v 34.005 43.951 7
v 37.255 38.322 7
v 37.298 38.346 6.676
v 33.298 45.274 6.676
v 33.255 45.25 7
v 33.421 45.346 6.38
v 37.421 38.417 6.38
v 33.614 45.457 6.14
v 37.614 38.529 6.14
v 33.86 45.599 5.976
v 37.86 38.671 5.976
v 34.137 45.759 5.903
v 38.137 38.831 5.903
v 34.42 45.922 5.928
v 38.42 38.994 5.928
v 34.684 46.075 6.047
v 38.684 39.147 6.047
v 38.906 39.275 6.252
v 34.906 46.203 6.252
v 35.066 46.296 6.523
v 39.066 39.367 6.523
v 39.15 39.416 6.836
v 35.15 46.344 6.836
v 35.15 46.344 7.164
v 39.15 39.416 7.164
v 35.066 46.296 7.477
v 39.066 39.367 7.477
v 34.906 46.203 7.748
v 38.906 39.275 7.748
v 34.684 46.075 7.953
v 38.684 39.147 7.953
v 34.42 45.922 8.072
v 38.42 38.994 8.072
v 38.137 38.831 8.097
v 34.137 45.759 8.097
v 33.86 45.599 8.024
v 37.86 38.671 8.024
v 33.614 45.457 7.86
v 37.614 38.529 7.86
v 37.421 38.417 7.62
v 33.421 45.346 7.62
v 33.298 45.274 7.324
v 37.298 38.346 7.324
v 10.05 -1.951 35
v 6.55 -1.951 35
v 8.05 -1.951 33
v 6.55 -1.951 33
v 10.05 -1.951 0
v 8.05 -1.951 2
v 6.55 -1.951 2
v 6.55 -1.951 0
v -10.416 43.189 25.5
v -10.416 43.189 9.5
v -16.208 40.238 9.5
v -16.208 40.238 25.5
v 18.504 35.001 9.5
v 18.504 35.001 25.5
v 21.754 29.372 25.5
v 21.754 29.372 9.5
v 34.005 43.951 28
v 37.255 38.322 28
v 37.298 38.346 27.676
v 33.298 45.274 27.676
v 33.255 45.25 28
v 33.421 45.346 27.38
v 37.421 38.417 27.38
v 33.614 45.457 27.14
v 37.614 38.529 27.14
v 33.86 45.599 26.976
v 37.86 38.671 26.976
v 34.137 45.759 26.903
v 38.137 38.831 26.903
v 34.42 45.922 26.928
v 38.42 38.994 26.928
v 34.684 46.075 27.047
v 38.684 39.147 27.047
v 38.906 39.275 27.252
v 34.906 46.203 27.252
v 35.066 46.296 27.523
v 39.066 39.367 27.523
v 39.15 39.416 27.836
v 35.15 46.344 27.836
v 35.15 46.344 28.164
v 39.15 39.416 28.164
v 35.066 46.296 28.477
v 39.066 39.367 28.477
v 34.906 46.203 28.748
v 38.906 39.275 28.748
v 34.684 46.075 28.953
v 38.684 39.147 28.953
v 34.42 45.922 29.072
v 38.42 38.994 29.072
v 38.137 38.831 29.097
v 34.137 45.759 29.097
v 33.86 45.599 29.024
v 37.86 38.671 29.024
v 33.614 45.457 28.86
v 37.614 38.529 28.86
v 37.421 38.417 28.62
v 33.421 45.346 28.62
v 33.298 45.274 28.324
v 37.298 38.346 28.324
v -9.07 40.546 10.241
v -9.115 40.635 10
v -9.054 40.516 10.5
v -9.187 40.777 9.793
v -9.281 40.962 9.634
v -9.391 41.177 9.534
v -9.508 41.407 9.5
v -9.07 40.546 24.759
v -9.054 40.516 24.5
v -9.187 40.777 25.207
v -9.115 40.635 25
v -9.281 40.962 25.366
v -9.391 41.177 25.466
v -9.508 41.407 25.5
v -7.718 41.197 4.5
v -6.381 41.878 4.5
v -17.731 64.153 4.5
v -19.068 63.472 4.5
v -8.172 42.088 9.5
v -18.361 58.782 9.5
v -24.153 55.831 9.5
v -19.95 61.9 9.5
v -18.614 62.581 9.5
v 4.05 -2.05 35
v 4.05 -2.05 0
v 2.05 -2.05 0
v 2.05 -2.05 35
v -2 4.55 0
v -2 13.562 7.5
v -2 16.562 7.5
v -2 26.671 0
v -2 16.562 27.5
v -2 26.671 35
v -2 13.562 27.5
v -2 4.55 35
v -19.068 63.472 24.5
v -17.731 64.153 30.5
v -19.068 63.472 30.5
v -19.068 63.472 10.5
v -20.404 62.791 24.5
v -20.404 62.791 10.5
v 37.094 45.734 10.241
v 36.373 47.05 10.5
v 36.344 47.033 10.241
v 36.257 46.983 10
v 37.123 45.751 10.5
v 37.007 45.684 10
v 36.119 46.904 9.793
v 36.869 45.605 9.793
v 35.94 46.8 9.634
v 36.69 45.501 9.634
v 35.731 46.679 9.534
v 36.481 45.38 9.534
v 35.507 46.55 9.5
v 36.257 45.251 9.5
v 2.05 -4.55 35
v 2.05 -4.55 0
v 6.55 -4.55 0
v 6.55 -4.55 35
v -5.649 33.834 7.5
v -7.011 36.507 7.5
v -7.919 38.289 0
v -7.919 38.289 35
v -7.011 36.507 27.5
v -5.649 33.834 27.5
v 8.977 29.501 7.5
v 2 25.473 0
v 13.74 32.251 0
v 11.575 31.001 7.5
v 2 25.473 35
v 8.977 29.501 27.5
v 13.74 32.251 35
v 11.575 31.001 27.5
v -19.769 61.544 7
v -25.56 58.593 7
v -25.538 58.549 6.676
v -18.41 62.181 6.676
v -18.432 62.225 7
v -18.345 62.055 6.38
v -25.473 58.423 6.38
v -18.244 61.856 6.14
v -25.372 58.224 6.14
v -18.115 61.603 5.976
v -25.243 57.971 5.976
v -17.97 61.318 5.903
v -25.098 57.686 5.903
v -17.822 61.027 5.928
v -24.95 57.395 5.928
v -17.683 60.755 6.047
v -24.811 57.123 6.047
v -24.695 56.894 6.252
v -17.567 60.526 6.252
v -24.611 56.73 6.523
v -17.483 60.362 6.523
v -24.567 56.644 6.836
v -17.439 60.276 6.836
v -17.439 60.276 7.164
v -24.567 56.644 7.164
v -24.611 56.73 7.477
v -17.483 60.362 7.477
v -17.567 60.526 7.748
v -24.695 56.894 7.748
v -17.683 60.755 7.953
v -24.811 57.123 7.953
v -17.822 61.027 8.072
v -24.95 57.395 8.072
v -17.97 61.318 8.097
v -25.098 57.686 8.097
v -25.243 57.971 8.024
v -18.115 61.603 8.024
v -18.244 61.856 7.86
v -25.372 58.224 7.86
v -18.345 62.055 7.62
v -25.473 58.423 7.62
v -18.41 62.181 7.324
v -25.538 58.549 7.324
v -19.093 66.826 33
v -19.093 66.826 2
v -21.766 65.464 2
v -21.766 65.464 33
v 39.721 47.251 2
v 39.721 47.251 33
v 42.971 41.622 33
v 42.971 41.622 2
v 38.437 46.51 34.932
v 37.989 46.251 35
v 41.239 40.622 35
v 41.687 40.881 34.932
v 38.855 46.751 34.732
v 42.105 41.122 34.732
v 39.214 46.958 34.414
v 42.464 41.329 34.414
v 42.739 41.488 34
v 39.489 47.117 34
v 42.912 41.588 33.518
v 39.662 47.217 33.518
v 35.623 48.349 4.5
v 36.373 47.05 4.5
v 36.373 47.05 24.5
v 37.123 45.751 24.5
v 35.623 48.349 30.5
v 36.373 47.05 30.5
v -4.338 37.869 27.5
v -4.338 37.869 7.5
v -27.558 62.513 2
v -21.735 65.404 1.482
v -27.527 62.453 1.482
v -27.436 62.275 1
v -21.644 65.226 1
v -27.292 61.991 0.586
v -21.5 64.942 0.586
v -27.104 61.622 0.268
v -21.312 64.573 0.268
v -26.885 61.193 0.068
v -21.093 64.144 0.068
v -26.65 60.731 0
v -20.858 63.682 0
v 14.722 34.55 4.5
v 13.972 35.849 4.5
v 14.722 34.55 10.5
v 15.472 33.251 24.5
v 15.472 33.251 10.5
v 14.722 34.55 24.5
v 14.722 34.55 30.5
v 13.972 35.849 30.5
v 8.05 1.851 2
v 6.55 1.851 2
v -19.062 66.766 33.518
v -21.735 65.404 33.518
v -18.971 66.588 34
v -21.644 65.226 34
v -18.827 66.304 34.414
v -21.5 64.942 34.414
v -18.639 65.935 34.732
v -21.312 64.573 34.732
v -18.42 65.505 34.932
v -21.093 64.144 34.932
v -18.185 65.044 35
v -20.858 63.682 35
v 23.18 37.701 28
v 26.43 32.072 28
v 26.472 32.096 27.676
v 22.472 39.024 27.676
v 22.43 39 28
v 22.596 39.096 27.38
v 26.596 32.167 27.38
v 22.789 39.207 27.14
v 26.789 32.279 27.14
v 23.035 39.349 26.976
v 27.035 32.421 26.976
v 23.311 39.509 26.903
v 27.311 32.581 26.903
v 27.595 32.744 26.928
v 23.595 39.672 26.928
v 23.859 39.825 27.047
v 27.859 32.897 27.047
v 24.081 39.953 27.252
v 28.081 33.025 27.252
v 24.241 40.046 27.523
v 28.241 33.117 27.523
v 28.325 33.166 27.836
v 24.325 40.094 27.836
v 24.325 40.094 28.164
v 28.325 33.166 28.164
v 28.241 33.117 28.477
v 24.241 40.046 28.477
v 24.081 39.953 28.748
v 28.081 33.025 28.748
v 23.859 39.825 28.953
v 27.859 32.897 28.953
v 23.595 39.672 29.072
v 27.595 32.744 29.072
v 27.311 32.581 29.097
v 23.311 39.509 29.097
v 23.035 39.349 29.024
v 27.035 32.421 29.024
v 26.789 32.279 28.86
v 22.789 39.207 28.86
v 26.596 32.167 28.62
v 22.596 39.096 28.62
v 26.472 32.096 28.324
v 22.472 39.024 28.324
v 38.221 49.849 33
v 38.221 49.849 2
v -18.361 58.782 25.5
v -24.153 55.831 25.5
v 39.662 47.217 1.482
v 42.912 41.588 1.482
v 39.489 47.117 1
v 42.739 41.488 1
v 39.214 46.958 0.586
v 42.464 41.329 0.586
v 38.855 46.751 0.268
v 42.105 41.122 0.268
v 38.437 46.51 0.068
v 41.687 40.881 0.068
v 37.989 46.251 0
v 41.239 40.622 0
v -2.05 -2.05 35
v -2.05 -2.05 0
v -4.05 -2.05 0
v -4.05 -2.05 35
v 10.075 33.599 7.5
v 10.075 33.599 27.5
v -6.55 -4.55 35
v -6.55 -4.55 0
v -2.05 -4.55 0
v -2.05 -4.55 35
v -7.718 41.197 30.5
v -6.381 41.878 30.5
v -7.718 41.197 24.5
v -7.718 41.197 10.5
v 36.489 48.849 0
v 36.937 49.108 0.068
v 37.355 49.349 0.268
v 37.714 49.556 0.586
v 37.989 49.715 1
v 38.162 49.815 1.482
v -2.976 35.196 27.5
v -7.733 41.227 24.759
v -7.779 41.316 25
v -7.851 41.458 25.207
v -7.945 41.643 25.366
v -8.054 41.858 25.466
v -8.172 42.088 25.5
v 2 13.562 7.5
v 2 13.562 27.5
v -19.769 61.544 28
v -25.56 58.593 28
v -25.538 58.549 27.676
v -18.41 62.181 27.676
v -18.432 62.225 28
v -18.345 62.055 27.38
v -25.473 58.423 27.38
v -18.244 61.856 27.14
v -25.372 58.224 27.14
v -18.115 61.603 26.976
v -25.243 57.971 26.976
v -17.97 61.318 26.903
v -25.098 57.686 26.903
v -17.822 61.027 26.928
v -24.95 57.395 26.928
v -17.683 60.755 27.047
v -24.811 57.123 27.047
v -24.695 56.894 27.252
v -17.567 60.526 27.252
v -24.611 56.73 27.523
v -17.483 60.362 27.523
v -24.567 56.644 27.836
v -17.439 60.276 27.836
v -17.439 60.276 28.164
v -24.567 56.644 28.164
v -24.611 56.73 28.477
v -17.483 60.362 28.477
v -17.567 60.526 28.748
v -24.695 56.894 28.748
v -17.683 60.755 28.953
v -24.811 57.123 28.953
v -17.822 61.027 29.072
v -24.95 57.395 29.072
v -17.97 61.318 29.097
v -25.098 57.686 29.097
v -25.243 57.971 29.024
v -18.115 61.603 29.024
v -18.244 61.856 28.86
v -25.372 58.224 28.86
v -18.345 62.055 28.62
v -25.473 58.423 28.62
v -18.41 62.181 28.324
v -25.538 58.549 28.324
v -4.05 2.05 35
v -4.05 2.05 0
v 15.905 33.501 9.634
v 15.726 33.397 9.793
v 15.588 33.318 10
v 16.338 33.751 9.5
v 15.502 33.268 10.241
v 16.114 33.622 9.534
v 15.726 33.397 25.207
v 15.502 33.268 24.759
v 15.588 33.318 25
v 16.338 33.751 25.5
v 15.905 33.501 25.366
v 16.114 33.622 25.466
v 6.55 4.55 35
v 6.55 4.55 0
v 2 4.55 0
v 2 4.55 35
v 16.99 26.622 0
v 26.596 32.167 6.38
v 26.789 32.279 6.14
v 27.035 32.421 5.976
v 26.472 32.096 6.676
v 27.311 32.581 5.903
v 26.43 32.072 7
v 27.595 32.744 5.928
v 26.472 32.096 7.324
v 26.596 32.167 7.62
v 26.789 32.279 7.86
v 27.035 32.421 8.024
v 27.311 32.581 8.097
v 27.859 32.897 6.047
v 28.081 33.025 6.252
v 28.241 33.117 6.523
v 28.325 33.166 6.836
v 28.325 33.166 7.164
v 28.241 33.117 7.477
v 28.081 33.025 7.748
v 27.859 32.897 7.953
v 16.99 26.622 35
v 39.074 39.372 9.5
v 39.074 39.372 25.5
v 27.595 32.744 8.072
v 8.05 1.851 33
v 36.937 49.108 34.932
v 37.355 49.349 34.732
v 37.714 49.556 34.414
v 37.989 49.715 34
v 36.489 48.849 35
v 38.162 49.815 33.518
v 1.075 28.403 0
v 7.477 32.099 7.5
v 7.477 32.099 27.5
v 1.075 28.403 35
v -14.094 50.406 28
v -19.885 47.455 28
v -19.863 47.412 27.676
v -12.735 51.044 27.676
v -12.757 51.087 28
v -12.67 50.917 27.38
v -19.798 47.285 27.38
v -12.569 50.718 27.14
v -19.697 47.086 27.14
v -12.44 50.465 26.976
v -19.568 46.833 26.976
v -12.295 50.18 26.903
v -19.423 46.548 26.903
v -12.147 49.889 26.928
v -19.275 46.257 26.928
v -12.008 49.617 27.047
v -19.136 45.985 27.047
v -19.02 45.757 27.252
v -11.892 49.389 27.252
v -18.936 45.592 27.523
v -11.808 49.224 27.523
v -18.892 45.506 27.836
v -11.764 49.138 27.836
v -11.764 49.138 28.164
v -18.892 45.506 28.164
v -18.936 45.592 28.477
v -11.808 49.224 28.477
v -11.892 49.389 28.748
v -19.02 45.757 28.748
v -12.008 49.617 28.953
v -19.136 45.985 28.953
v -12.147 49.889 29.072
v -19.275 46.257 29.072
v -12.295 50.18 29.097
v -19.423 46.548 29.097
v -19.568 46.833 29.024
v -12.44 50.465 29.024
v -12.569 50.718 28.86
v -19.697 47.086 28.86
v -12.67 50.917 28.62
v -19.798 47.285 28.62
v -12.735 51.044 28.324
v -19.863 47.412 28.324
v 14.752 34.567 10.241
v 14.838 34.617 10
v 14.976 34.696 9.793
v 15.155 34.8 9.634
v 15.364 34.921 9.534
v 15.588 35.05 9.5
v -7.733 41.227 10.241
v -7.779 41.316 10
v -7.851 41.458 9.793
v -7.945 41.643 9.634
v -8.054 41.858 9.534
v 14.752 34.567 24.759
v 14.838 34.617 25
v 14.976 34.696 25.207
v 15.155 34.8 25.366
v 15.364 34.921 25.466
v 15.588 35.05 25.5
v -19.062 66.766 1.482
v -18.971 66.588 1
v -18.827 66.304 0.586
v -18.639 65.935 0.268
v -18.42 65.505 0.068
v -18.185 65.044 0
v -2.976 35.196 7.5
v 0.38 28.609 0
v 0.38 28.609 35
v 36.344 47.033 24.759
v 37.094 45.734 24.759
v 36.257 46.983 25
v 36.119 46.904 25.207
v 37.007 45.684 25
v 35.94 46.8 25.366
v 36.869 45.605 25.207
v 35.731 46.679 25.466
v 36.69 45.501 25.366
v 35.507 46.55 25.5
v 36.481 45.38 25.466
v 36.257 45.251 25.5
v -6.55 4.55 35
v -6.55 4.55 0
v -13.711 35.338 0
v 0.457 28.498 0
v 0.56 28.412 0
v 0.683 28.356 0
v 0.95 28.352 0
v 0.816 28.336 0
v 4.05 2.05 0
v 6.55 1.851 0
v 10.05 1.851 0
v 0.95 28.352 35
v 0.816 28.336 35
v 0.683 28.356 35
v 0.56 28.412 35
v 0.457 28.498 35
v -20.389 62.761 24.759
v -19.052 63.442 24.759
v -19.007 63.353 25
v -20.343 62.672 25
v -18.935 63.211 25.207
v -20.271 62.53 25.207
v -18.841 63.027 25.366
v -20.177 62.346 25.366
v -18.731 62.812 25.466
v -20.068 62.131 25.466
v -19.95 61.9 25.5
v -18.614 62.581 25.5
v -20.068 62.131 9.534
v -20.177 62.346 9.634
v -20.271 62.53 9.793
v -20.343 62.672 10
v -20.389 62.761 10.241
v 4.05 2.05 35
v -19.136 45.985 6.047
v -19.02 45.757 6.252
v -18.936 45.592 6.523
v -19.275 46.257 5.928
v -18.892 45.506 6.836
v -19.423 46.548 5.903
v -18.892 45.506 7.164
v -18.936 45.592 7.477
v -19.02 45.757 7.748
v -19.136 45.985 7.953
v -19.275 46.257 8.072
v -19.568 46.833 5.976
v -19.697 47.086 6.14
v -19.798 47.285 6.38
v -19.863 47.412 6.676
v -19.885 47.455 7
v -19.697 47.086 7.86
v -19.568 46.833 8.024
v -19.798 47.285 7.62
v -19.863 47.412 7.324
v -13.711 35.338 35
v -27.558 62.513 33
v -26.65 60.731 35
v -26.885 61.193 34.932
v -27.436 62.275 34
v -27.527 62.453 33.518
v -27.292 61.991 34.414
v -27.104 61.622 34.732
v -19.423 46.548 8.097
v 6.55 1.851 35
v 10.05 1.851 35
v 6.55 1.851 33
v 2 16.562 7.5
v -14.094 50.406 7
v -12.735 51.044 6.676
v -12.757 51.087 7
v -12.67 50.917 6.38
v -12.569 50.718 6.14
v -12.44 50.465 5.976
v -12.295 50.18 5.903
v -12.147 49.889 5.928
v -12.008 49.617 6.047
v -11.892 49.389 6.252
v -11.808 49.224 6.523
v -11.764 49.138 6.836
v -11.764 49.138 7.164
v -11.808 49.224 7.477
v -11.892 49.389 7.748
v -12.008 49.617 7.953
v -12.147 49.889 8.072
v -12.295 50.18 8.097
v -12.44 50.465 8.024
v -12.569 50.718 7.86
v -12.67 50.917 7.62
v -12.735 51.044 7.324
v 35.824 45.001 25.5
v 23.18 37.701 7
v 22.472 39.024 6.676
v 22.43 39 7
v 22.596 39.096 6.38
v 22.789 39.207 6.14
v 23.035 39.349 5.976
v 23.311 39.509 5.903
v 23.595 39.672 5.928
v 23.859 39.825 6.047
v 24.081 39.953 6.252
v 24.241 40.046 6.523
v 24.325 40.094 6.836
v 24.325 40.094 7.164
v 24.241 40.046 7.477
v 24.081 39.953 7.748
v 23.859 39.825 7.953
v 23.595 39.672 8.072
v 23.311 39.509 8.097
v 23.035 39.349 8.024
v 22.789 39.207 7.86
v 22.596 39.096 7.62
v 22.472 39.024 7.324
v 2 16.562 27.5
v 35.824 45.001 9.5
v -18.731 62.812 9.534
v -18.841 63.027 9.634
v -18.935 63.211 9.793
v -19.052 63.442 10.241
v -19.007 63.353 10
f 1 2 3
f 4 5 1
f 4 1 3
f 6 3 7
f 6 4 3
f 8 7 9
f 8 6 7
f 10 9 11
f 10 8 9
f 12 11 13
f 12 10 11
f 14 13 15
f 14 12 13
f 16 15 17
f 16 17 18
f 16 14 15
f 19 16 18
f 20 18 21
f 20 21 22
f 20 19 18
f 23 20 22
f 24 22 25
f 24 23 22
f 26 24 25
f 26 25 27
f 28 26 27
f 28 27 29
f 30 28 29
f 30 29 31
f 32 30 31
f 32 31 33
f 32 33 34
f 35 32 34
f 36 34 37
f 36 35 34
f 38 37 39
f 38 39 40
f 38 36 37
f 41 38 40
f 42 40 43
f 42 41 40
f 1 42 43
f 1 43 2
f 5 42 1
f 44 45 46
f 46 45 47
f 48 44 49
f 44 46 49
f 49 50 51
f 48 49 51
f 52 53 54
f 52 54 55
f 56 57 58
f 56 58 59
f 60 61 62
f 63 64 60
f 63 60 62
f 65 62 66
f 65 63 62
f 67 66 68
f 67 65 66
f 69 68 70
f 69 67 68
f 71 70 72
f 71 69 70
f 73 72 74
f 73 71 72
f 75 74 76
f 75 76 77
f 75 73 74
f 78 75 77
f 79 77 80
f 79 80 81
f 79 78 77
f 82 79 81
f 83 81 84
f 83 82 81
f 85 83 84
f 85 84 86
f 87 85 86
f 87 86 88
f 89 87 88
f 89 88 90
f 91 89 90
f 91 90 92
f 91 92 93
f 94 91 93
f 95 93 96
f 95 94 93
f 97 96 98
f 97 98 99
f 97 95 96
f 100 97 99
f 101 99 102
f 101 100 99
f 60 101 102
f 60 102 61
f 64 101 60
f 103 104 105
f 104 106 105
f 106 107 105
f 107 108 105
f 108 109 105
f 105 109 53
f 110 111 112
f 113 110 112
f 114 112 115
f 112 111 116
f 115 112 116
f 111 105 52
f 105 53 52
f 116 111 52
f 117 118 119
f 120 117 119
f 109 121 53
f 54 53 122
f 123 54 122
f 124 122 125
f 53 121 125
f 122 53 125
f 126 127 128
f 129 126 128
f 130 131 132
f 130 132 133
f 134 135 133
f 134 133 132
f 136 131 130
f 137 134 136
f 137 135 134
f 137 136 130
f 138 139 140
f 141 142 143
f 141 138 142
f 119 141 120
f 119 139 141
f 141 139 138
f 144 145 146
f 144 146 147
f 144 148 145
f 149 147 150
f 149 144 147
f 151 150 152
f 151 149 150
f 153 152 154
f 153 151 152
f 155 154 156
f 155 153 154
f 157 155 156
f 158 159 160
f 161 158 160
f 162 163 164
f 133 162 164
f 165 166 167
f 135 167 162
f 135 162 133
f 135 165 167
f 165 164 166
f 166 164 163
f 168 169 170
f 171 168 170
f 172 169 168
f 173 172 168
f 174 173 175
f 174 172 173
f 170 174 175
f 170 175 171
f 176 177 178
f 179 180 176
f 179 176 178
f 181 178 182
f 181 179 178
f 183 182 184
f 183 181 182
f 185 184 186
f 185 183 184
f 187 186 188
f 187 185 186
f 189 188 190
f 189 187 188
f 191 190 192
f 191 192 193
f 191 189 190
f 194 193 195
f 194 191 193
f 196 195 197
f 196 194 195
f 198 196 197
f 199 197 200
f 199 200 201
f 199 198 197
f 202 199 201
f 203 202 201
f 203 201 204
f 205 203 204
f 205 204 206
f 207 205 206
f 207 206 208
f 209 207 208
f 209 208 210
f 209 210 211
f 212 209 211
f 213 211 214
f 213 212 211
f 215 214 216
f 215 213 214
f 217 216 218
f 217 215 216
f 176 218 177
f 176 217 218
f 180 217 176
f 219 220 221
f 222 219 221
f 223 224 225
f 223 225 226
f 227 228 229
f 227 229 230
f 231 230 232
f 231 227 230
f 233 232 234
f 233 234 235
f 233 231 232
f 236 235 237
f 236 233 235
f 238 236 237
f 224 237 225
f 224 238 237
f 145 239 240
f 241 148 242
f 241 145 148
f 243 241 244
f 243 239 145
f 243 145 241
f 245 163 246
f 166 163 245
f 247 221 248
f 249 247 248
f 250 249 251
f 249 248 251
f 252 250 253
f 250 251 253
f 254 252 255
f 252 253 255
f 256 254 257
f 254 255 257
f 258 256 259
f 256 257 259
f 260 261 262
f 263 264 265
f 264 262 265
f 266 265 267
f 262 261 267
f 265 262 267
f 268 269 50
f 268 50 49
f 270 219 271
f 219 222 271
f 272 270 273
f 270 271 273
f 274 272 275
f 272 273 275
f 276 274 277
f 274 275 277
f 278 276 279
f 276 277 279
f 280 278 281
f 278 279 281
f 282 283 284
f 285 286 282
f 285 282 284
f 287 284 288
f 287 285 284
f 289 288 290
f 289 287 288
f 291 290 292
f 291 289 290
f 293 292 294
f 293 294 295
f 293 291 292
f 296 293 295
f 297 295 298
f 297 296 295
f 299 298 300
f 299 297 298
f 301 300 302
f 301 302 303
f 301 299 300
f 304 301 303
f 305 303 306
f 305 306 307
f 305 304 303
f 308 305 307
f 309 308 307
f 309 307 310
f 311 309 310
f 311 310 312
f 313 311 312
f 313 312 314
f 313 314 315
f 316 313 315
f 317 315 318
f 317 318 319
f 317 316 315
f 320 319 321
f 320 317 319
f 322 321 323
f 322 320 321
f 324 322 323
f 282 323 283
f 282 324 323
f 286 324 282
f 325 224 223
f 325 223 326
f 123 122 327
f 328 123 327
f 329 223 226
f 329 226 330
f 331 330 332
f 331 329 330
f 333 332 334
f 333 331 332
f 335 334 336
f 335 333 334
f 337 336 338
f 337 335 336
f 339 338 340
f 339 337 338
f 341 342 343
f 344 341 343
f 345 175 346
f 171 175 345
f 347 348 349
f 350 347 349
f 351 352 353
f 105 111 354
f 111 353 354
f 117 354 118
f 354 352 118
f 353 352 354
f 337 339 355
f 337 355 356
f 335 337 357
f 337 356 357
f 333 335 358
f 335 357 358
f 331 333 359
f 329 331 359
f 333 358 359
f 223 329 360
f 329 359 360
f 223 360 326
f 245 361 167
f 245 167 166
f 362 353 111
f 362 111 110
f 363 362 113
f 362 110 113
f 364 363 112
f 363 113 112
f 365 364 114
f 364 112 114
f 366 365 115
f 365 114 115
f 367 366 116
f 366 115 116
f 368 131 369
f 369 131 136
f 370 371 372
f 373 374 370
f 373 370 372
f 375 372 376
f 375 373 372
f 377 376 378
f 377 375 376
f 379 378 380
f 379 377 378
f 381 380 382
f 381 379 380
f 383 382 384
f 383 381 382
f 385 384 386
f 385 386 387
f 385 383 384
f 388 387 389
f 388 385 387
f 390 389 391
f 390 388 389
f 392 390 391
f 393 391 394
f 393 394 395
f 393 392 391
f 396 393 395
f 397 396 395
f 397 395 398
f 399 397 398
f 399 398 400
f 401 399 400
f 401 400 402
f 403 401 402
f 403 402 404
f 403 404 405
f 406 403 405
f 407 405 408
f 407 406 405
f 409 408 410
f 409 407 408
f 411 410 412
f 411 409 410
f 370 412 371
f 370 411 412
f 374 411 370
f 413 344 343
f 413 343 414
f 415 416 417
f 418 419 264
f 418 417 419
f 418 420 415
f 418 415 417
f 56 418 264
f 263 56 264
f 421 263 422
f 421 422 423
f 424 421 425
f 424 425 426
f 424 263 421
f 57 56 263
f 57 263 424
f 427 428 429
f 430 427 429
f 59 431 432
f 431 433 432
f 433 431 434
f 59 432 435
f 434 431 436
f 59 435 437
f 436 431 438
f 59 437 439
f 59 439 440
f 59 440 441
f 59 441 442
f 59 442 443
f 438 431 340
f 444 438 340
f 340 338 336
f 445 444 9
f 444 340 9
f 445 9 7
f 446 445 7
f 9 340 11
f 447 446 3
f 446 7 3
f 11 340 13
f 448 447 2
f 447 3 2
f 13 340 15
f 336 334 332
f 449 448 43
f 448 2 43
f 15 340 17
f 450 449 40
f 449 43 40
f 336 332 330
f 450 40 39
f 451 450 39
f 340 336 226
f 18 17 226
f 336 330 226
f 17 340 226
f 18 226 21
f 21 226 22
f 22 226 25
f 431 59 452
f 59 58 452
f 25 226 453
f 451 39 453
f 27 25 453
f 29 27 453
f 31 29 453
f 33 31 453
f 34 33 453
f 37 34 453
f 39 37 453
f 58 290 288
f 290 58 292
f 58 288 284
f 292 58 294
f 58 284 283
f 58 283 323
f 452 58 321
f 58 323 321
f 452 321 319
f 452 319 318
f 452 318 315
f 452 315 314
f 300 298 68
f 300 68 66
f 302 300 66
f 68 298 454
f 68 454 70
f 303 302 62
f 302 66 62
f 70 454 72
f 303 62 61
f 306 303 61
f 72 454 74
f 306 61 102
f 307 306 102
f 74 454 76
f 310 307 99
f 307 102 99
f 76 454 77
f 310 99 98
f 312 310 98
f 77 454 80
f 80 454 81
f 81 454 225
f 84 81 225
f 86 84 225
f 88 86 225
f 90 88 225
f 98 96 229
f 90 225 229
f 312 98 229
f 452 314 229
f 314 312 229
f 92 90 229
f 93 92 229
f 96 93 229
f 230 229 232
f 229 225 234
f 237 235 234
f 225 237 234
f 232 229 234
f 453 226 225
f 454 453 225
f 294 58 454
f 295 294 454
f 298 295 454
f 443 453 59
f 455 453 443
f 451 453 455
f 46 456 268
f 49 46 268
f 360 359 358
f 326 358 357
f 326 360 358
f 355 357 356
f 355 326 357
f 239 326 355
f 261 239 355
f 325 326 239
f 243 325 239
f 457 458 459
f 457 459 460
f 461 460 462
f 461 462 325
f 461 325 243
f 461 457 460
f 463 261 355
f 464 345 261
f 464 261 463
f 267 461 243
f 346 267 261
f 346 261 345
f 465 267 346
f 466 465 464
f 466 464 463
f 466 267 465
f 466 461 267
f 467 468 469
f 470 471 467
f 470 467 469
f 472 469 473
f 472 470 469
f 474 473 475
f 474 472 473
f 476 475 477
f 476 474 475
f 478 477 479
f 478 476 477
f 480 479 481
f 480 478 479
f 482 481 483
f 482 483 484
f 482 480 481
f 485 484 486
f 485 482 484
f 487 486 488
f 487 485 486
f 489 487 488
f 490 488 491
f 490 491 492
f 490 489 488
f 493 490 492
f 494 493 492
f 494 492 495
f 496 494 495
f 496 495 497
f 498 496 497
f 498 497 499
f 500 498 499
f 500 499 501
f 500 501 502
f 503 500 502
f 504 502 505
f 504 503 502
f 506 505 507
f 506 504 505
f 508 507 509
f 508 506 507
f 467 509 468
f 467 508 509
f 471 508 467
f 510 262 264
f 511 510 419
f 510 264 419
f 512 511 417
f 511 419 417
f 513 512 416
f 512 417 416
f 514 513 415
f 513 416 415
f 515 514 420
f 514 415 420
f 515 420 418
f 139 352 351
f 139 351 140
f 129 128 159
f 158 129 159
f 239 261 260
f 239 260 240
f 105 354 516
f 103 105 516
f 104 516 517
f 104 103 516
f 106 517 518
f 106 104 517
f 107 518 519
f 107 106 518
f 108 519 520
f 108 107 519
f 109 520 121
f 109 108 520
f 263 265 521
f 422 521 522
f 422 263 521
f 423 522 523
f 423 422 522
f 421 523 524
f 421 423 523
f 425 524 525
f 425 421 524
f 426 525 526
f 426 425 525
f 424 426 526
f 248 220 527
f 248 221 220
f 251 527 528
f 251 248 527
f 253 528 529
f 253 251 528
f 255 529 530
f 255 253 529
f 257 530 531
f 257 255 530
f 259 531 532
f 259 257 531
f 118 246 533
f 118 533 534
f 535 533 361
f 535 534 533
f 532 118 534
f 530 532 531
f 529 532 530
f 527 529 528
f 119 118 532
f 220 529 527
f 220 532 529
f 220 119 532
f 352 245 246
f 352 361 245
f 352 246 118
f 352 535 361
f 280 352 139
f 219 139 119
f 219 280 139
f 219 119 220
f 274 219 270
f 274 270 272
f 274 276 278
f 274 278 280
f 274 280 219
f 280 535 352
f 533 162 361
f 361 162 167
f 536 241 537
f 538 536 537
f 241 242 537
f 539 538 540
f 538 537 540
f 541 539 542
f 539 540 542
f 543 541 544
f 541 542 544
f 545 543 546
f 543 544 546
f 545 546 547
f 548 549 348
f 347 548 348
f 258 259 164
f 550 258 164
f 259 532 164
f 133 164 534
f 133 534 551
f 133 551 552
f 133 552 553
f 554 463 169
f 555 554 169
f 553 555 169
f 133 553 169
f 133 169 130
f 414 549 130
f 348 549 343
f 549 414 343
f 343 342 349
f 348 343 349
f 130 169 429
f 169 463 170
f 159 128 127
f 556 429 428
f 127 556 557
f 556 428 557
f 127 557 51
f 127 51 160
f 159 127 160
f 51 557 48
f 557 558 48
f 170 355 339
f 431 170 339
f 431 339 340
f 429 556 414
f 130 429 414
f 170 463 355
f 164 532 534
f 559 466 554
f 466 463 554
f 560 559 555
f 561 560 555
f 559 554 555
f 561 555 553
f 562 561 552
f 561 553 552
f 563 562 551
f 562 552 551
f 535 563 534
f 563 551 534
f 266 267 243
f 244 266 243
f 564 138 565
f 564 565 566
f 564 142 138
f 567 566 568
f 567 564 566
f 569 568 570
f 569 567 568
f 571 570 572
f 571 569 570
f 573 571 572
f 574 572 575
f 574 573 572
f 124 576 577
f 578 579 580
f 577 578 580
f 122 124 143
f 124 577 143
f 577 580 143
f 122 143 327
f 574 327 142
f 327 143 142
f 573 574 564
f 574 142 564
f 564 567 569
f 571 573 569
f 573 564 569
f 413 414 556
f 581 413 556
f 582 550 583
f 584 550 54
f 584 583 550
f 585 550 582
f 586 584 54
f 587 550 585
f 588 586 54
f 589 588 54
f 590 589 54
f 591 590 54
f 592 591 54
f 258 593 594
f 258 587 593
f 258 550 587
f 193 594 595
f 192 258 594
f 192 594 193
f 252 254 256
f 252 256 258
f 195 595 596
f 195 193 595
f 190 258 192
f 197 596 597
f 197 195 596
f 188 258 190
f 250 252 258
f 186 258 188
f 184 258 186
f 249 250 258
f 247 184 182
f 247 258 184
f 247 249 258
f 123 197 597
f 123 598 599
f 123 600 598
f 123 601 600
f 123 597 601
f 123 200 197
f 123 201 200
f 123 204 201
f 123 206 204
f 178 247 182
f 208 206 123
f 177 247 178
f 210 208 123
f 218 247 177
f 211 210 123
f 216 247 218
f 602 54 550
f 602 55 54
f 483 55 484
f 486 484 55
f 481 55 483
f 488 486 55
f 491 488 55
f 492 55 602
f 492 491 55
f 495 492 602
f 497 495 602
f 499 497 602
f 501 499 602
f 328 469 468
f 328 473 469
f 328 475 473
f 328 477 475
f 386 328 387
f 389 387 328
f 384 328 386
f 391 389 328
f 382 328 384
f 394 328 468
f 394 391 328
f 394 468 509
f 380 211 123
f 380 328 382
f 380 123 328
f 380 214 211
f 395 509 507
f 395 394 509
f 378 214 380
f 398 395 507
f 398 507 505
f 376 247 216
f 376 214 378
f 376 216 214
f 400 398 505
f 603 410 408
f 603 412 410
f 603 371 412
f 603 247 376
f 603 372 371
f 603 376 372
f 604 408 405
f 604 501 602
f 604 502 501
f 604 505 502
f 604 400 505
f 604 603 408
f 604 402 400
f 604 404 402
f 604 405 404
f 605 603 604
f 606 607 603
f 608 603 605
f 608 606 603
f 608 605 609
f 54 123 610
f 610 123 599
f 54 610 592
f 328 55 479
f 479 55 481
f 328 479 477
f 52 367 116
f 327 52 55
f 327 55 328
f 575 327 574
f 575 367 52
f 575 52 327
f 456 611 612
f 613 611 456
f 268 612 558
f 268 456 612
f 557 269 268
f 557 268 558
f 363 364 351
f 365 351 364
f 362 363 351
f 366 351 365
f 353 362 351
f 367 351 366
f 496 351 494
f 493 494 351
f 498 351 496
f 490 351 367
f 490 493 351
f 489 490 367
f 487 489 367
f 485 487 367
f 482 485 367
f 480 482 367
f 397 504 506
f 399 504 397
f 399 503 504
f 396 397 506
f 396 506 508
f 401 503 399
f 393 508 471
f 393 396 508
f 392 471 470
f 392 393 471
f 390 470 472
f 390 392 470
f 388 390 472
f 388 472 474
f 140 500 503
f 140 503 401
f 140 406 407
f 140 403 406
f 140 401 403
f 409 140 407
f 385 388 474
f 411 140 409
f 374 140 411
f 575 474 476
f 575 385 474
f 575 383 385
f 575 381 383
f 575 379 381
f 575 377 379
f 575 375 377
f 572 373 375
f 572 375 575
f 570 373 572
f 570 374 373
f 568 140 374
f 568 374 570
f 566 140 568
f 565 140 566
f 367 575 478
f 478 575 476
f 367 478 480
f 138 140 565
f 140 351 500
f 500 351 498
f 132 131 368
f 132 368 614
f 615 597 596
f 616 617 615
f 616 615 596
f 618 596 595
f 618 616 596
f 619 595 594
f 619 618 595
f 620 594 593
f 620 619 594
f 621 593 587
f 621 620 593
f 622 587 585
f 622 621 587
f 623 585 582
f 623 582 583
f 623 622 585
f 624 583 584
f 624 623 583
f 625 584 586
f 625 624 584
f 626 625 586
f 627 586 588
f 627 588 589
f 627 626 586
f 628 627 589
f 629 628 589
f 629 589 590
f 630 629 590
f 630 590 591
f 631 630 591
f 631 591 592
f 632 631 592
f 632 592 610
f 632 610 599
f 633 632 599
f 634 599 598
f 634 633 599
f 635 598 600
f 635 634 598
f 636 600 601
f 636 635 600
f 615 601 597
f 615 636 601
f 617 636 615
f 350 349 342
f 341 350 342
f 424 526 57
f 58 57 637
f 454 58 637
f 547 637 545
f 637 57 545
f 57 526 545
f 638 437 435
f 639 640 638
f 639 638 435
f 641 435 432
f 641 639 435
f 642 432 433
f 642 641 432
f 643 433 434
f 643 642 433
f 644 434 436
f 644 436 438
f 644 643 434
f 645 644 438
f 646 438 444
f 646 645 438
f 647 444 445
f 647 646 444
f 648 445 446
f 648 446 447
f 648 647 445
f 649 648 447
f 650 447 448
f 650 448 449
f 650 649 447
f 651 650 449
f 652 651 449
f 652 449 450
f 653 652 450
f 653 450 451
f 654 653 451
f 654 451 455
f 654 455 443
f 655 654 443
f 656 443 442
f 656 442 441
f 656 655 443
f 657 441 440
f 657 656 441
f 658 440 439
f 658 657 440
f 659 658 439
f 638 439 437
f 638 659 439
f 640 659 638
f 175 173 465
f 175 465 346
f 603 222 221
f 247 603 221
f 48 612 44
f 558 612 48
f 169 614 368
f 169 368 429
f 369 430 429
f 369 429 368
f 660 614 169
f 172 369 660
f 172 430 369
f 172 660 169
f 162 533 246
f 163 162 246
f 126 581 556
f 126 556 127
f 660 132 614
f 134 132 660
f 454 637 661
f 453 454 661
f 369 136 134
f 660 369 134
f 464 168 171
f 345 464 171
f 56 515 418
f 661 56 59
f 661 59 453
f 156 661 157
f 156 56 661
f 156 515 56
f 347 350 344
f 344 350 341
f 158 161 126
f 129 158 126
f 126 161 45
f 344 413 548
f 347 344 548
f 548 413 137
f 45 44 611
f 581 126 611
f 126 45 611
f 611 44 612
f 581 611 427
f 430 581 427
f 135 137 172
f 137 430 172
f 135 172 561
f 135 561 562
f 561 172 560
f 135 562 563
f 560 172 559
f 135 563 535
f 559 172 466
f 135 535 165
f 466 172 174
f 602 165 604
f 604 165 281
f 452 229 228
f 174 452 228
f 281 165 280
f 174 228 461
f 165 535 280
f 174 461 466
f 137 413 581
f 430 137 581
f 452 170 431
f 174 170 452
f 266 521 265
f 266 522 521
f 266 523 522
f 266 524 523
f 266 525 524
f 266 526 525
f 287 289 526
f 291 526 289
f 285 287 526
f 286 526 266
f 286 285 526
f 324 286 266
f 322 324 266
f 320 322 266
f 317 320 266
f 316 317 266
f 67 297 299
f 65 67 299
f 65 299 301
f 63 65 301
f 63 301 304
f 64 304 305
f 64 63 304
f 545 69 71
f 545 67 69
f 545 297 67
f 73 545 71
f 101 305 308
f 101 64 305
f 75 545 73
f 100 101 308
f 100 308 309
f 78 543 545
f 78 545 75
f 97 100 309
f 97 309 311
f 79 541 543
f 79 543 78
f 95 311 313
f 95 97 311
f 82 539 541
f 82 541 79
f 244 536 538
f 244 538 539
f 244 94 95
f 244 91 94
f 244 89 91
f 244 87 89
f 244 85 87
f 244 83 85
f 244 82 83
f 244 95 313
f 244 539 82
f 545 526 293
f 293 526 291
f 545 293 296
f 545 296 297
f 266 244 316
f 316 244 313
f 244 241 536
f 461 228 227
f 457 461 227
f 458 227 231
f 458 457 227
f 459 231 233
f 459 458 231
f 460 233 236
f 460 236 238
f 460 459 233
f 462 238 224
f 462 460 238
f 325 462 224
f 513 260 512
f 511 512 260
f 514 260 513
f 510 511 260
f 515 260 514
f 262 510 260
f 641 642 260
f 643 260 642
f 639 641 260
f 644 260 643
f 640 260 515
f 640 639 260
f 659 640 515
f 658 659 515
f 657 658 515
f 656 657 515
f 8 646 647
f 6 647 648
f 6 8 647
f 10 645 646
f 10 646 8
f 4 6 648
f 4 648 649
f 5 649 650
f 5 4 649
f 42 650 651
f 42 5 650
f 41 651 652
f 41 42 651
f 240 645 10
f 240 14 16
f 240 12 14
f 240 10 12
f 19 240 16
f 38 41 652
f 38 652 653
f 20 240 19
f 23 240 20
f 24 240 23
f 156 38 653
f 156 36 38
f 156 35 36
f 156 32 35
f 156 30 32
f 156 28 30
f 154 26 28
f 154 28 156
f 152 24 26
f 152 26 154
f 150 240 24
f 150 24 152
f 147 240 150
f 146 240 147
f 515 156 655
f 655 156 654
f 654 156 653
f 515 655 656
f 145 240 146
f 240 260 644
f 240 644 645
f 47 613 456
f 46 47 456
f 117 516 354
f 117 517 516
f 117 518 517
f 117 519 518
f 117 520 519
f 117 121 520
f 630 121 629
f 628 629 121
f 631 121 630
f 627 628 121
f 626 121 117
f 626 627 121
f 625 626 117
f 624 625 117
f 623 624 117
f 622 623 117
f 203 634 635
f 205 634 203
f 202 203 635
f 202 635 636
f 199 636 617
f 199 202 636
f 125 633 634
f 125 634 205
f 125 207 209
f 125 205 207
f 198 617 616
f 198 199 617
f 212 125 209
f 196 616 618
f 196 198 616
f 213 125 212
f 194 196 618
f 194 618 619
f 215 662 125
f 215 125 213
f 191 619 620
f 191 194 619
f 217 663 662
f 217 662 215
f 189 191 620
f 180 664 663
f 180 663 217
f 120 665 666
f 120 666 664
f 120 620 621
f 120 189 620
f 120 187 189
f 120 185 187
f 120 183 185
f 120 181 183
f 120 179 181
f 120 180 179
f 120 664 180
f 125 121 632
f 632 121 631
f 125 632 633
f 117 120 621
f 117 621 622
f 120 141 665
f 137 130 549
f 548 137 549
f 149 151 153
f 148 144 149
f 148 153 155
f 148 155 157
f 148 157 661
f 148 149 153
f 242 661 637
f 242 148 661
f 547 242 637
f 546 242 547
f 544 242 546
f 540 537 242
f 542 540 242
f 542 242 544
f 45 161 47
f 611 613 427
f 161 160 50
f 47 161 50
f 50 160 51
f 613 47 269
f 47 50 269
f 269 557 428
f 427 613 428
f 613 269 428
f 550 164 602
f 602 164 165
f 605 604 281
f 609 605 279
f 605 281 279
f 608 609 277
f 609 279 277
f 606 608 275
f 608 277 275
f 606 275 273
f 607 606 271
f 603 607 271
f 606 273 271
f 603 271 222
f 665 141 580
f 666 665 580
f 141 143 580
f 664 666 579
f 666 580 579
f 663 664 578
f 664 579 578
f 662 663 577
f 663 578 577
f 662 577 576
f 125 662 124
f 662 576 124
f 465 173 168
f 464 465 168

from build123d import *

# Parameters (mm, degrees)
BOSS_EXTRUDE1_DEPTH      = 35
BOSS_EXTRUDE2_DEPTH      = 35
FILLET1_R                = 0.5
SKETCH3_W                = 26
SKETCH3_H                = 25
CUT_EXTRUDE1_DEPTH       = 1.5
SKETCH4_W                = 16
SKETCH4_H                = 25
CUT_EXTRUDE2_DEPTH       = 2
FILLET3_R                = 1
SKETCH5_W                = 26
SKETCH5_H                = 25
CUT_EXTRUDE3_DEPTH       = 1.5
SKETCH6_W                = 16
SKETCH6_H                = 25
CUT_EXTRUDE4_DEPTH       = 2
FILLET4_R                = 1
SKETCH8_W                = 20
SKETCH8_H                = 3
CUT_EXTRUDE5_DEPTH       = 4
SKETCH9_W                = 20
SKETCH9_H                = 3
CUT_EXTRUDE6_DEPTH       = 4
SKETCH10_W               = 20
SKETCH10_H               = 3
CUT_EXTRUDE7_DEPTH       = 4
SKETCH11_R               = 1.1
CUT_EXTRUDE8_DEPTH       = 10
SKETCH12_R               = 1.1
CUT_EXTRUDE9_DEPTH       = 5
FILLET7_R                = 2
BOSS_EXTRUDE3_DEPTH      = 3.5
BOSS_EXTRUDE3_DEPTH_BACK = 1
SKETCH14_W               = 35
SKETCH14_H               = 3.801557548
SKETCH15_W               = 1.5
SKETCH15_H               = 31
CUT_EXTRUDE10_DEPTH      = 5
SKETCH18_R               = 1.1
SKETCH18_W               = 16
SKETCH18_H               = 20
BOSS_EXTRUDE4_DEPTH      = 6.5
SKETCH19_R               = 1.1
SKETCH19_W               = 16
SKETCH19_H               = 17.5
BOSS_EXTRUDE5_DEPTH      = 6.5


with BuildPart() as part:
    # Sketch1 → Boss-Extrude1 (new body)
    with BuildSketch(Plane.XY):
        Polygon((6.55, 4.55), (-6.55, 4.55), (-6.55, -4.55), (-2.05, -4.55), (-2.05, -2.05), (-4.05, -2.05), (-4.05, 2.05), (4.05, 2.05), (4.05, -2.05), (2.05, -2.05), (2.05, -4.55), (6.55, -4.55), align=None)
    extrude(amount=BOSS_EXTRUDE1_DEPTH)

    # Sketch2 → Boss-Extrude2 (add, through all)
    with BuildSketch(Plane.XY.offset(35)):
        Polygon((2, 4.55), (2, 25.472649731), (39.72114317, 47.250961894), (38.22114317, 49.849038106), (0.618900538, 28.1393732), (-19.093062702, 66.826279338), (-21.766082275, 65.464307839), (-2, 26.671187114), (-2, 4.55), align=None)
    extrude(amount=-BOSS_EXTRUDE2_DEPTH)

    # Fillet1
    fillet1_edges = [part.edges().sort_by_distance(p)[0] for p in [
        (0.618900538, 28.1393732, 17.5),
    ]]
    fillet(fillet1_edges, radius=FILLET1_R)

    # Sketch3 → Cut-Extrude1 (cut)
    with BuildSketch(Plane(origin=(-12.029980884, 20.836538106, 0), x_dir=(0, 0, 1), z_dir=(-0.4999999999999978, 0.8660254037844398, 0))):
        with Locations((17.5, 42.525)):
            Rectangle(SKETCH3_W, SKETCH3_H)
    extrude(amount=-CUT_EXTRUDE1_DEPTH, mode=Mode.SUBTRACT)

    # Sketch4 → Cut-Extrude2 (cut)
    with BuildSketch(Plane(origin=(-11.279980884, 19.5375, 0), x_dir=(0, 0, 1), z_dir=(-0.49999999999999795, 0.8660254037844399, 0))):
        with Locations((17.5, 42.525)):
            Rectangle(SKETCH4_W, SKETCH4_H)
    extrude(amount=-CUT_EXTRUDE2_DEPTH, mode=Mode.SUBTRACT)

    # Fillet3
    fillet3_edges = [part.edges().sort_by_distance(p)[0] for p in [
        (36.748066959, 46.400480947, 9.5),
        (36.748066959, 46.400480947, 25.5),
        (15.097431864, 33.900480947, 25.5),
        (15.097431864, 33.900480947, 9.5),
    ]]
    fillet(fillet3_edges, radius=FILLET3_R)

    # Sketch5 → Cut-Extrude3 (cut)
    with BuildSketch(Plane(origin=(11.873956138, 6.050082838, 0), x_dir=(0, 0, -1), z_dir=(0.8910065241883675, 0.45399049973954786, 0))):
        with Locations((-17.5, 52.710719955)):
            Rectangle(SKETCH5_W, SKETCH5_H)
    extrude(amount=-CUT_EXTRUDE3_DEPTH, mode=Mode.SUBTRACT)

    # Sketch6 → Cut-Extrude4 (cut)
    with BuildSketch(Plane(origin=(10.537446352, 5.369097089, 0), x_dir=(0, 0, -1), z_dir=(0.8910065241883673, 0.4539904997395479, 0))):
        with Locations((-17.5, 52.710719955)):
            Rectangle(SKETCH6_W, SKETCH6_H)
    extrude(amount=-CUT_EXTRUDE4_DEPTH, mode=Mode.SUBTRACT)

    # Fillet4
    fillet4_edges = [part.edges().sort_by_distance(p)[0] for p in [
        (-19.735855882, 63.131781141, 25.5),
        (-19.735855882, 63.131781141, 9.5),
        (-8.386093389, 40.856618036, 9.5),
        (-8.386093389, 40.856618036, 25.5),
    ]]
    fillet(fillet4_edges, radius=FILLET4_R)

    # Sketch8 → Cut-Extrude5 (cut)
    with BuildSketch(Plane(origin=(-10.529980884, 18.238461894, 0), x_dir=(0, 0, -1), z_dir=(0.49999999999999806, -0.8660254037844399, 0))):
        with Locations((-17.5, 24.025)):
            Rectangle(SKETCH8_W, SKETCH8_H)
    extrude(amount=-CUT_EXTRUDE5_DEPTH, mode=Mode.SUBTRACT)

    # Sketch9 → Cut-Extrude6 (cut)
    with BuildSketch(Plane(origin=(9.200936565, 4.688111339, 0), x_dir=(0, 0, 1), z_dir=(-0.8910065241883675, -0.45399049973954797, 0))):
        with Locations((17.5, 34.210719955)):
            Rectangle(SKETCH9_W, SKETCH9_H)
    extrude(amount=-CUT_EXTRUDE6_DEPTH, mode=Mode.SUBTRACT)

    # Sketch10 → Cut-Extrude7 (cut)
    with BuildSketch(Plane.ZY.offset(2)):
        with Locations((17.5, 15.062177826)):
            Rectangle(SKETCH10_W, SKETCH10_H)
    extrude(amount=-CUT_EXTRUDE7_DEPTH, mode=Mode.SUBTRACT)

    # Sketch11 → Cut-Extrude8 (cut)
    with BuildSketch(Plane(origin=(-11.279980884, 19.5375, 0), x_dir=(0, 0, 1), z_dir=(-0.4999999999999979, 0.8660254037844398, 0))):
        with Locations(Location((28, 52.525, 0), (0, 0, 270))):
            Circle(SKETCH11_R)
        with Locations(Location((7, 52.525, 0), (0, 0, 270))):
            Circle(SKETCH11_R)
        with Locations(Location((28, 40.025, 0), (0, 0, 270))):
            Circle(SKETCH11_R)
        with Locations(Location((7, 40.025, 0), (0, 0, 270))):
            Circle(SKETCH11_R)
    extrude(amount=-CUT_EXTRUDE8_DEPTH, mode=Mode.SUBTRACT)

    # Sketch12 → Cut-Extrude9 (cut)
    with BuildSketch(Plane(origin=(10.537446352, 5.369097089, 0), x_dir=(0, 0, -1), z_dir=(0.8910065241883673, 0.4539904997395479, 0))):
        with Locations(Location((-7, 62.710719955, 0), (0, 0, 90))):
            Circle(SKETCH12_R)
        with Locations(Location((-28, 62.710719955, 0), (0, 0, 90))):
            Circle(SKETCH12_R)
        with Locations(Location((-7, 50.210719955, 0), (0, 0, 90))):
            Circle(SKETCH12_R)
        with Locations(Location((-28, 50.210719955, 0), (0, 0, 90))):
            Circle(SKETCH12_R)
    extrude(amount=-CUT_EXTRUDE9_DEPTH, mode=Mode.SUBTRACT)

    # Fillet7
    fillet7_edges = [part.edges().sort_by_distance(p)[0] for p in [
        (-20.429572488, 66.145293588, 0),
        (38.97114317, 48.55, 0),
        (38.97114317, 48.55, 35),
        (-20.429572488, 66.145293588, 35),
    ]]
    fillet(fillet7_edges, radius=FILLET7_R)

    # Sketch14 → Boss-Extrude3 (add, two sides: drawn at the far end of the back side and taken through both)
    with BuildSketch(Plane(origin=(6.55, 0, 0), x_dir=(0, 0, -1), z_dir=(1, 0, 0)).offset(-BOSS_EXTRUDE3_DEPTH_BACK)):
        with Locations((-17.5, -0.05)):
            Rectangle(SKETCH14_W, SKETCH14_H)
    extrude(amount=BOSS_EXTRUDE3_DEPTH + BOSS_EXTRUDE3_DEPTH_BACK)

    # Sketch15 → Cut-Extrude10 (cut)
    with BuildSketch(Plane(origin=(0, 1.850778774, 0), x_dir=(1, 0, 0), z_dir=(0, 1, 0))):
        with Locations((7.3, -17.5)):
            Rectangle(SKETCH15_W, SKETCH15_H)
    extrude(amount=-CUT_EXTRUDE10_DEPTH, mode=Mode.SUBTRACT)

    # Sketch18 → Boss-Extrude4 (add)
    with BuildSketch(Plane(origin=(-10.529980884, 18.238461894, 0), x_dir=(0, 0, -1), z_dir=(0.49999999999999806, -0.8660254037844398, 0))):
        with BuildLine():
            Line((-35, 28.025), (-35, 56.025))
            ThreePointArc((-35, 56.025), (-34.414213562, 57.439213562), (-33, 58.025))
            Line((-33, 58.025), (-2, 58.025))
            ThreePointArc((-2, 58.025), (-0.585786438, 57.439213562), (0, 56.025))
            Line((0, 56.025), (0, 28.025))
            Line((0, 28.025), (-35, 28.025))
        make_face()
        with Locations(Location((-7, 52.525, 0), (0, 0, 270))):
            Circle(SKETCH18_R, mode=Mode.SUBTRACT)
        with Locations(Location((-7, 40.025, 0), (0, 0, 270))):
            Circle(SKETCH18_R, mode=Mode.SUBTRACT)
        with Locations(Location((-28, 40.025, 0), (0, 0, 270))):
            Circle(SKETCH18_R, mode=Mode.SUBTRACT)
        with Locations(Location((-28, 52.525, 0), (0, 0, 270))):
            Circle(SKETCH18_R, mode=Mode.SUBTRACT)
        with Locations((-17.5, 43.525)):
            Rectangle(SKETCH18_W, SKETCH18_H, mode=Mode.SUBTRACT)
    extrude(amount=BOSS_EXTRUDE4_DEPTH)

    # Sketch19 → Boss-Extrude5 (add)
    with BuildSketch(Plane(origin=(9.200936565, 4.688111339, 0), x_dir=(0, 0, 1), z_dir=(-0.8910065241883673, -0.45399049973954797, 0))):
        with BuildLine():
            Line((33, 68.210719955), (2, 68.210719955))
            ThreePointArc((2, 68.210719955), (0.585786438, 67.624933517), (0, 66.210719955))
            Line((0, 66.210719955), (0, 37.710719955))
            Line((0, 37.710719955), (35, 37.710719955))
            Line((35, 37.710719955), (35, 66.210719955))
            ThreePointArc((35, 66.210719955), (34.414213562, 67.624933517), (33, 68.210719955))
        make_face()
        with Locations(Location((28, 50.210719955, 0), (0, 0, 90))):
            Circle(SKETCH19_R, mode=Mode.SUBTRACT)
        with Locations(Location((7, 50.210719955, 0), (0, 0, 90))):
            Circle(SKETCH19_R, mode=Mode.SUBTRACT)
        with Locations(Location((7, 62.710719955, 0), (0, 0, 90))):
            Circle(SKETCH19_R, mode=Mode.SUBTRACT)
        with Locations(Location((28, 62.710719955, 0), (0, 0, 90))):
            Circle(SKETCH19_R, mode=Mode.SUBTRACT)
        with Locations((17.5, 51.960719955)):
            Rectangle(SKETCH19_W, SKETCH19_H, mode=Mode.SUBTRACT)
    extrude(amount=BOSS_EXTRUDE5_DEPTH)


solid = part.part
